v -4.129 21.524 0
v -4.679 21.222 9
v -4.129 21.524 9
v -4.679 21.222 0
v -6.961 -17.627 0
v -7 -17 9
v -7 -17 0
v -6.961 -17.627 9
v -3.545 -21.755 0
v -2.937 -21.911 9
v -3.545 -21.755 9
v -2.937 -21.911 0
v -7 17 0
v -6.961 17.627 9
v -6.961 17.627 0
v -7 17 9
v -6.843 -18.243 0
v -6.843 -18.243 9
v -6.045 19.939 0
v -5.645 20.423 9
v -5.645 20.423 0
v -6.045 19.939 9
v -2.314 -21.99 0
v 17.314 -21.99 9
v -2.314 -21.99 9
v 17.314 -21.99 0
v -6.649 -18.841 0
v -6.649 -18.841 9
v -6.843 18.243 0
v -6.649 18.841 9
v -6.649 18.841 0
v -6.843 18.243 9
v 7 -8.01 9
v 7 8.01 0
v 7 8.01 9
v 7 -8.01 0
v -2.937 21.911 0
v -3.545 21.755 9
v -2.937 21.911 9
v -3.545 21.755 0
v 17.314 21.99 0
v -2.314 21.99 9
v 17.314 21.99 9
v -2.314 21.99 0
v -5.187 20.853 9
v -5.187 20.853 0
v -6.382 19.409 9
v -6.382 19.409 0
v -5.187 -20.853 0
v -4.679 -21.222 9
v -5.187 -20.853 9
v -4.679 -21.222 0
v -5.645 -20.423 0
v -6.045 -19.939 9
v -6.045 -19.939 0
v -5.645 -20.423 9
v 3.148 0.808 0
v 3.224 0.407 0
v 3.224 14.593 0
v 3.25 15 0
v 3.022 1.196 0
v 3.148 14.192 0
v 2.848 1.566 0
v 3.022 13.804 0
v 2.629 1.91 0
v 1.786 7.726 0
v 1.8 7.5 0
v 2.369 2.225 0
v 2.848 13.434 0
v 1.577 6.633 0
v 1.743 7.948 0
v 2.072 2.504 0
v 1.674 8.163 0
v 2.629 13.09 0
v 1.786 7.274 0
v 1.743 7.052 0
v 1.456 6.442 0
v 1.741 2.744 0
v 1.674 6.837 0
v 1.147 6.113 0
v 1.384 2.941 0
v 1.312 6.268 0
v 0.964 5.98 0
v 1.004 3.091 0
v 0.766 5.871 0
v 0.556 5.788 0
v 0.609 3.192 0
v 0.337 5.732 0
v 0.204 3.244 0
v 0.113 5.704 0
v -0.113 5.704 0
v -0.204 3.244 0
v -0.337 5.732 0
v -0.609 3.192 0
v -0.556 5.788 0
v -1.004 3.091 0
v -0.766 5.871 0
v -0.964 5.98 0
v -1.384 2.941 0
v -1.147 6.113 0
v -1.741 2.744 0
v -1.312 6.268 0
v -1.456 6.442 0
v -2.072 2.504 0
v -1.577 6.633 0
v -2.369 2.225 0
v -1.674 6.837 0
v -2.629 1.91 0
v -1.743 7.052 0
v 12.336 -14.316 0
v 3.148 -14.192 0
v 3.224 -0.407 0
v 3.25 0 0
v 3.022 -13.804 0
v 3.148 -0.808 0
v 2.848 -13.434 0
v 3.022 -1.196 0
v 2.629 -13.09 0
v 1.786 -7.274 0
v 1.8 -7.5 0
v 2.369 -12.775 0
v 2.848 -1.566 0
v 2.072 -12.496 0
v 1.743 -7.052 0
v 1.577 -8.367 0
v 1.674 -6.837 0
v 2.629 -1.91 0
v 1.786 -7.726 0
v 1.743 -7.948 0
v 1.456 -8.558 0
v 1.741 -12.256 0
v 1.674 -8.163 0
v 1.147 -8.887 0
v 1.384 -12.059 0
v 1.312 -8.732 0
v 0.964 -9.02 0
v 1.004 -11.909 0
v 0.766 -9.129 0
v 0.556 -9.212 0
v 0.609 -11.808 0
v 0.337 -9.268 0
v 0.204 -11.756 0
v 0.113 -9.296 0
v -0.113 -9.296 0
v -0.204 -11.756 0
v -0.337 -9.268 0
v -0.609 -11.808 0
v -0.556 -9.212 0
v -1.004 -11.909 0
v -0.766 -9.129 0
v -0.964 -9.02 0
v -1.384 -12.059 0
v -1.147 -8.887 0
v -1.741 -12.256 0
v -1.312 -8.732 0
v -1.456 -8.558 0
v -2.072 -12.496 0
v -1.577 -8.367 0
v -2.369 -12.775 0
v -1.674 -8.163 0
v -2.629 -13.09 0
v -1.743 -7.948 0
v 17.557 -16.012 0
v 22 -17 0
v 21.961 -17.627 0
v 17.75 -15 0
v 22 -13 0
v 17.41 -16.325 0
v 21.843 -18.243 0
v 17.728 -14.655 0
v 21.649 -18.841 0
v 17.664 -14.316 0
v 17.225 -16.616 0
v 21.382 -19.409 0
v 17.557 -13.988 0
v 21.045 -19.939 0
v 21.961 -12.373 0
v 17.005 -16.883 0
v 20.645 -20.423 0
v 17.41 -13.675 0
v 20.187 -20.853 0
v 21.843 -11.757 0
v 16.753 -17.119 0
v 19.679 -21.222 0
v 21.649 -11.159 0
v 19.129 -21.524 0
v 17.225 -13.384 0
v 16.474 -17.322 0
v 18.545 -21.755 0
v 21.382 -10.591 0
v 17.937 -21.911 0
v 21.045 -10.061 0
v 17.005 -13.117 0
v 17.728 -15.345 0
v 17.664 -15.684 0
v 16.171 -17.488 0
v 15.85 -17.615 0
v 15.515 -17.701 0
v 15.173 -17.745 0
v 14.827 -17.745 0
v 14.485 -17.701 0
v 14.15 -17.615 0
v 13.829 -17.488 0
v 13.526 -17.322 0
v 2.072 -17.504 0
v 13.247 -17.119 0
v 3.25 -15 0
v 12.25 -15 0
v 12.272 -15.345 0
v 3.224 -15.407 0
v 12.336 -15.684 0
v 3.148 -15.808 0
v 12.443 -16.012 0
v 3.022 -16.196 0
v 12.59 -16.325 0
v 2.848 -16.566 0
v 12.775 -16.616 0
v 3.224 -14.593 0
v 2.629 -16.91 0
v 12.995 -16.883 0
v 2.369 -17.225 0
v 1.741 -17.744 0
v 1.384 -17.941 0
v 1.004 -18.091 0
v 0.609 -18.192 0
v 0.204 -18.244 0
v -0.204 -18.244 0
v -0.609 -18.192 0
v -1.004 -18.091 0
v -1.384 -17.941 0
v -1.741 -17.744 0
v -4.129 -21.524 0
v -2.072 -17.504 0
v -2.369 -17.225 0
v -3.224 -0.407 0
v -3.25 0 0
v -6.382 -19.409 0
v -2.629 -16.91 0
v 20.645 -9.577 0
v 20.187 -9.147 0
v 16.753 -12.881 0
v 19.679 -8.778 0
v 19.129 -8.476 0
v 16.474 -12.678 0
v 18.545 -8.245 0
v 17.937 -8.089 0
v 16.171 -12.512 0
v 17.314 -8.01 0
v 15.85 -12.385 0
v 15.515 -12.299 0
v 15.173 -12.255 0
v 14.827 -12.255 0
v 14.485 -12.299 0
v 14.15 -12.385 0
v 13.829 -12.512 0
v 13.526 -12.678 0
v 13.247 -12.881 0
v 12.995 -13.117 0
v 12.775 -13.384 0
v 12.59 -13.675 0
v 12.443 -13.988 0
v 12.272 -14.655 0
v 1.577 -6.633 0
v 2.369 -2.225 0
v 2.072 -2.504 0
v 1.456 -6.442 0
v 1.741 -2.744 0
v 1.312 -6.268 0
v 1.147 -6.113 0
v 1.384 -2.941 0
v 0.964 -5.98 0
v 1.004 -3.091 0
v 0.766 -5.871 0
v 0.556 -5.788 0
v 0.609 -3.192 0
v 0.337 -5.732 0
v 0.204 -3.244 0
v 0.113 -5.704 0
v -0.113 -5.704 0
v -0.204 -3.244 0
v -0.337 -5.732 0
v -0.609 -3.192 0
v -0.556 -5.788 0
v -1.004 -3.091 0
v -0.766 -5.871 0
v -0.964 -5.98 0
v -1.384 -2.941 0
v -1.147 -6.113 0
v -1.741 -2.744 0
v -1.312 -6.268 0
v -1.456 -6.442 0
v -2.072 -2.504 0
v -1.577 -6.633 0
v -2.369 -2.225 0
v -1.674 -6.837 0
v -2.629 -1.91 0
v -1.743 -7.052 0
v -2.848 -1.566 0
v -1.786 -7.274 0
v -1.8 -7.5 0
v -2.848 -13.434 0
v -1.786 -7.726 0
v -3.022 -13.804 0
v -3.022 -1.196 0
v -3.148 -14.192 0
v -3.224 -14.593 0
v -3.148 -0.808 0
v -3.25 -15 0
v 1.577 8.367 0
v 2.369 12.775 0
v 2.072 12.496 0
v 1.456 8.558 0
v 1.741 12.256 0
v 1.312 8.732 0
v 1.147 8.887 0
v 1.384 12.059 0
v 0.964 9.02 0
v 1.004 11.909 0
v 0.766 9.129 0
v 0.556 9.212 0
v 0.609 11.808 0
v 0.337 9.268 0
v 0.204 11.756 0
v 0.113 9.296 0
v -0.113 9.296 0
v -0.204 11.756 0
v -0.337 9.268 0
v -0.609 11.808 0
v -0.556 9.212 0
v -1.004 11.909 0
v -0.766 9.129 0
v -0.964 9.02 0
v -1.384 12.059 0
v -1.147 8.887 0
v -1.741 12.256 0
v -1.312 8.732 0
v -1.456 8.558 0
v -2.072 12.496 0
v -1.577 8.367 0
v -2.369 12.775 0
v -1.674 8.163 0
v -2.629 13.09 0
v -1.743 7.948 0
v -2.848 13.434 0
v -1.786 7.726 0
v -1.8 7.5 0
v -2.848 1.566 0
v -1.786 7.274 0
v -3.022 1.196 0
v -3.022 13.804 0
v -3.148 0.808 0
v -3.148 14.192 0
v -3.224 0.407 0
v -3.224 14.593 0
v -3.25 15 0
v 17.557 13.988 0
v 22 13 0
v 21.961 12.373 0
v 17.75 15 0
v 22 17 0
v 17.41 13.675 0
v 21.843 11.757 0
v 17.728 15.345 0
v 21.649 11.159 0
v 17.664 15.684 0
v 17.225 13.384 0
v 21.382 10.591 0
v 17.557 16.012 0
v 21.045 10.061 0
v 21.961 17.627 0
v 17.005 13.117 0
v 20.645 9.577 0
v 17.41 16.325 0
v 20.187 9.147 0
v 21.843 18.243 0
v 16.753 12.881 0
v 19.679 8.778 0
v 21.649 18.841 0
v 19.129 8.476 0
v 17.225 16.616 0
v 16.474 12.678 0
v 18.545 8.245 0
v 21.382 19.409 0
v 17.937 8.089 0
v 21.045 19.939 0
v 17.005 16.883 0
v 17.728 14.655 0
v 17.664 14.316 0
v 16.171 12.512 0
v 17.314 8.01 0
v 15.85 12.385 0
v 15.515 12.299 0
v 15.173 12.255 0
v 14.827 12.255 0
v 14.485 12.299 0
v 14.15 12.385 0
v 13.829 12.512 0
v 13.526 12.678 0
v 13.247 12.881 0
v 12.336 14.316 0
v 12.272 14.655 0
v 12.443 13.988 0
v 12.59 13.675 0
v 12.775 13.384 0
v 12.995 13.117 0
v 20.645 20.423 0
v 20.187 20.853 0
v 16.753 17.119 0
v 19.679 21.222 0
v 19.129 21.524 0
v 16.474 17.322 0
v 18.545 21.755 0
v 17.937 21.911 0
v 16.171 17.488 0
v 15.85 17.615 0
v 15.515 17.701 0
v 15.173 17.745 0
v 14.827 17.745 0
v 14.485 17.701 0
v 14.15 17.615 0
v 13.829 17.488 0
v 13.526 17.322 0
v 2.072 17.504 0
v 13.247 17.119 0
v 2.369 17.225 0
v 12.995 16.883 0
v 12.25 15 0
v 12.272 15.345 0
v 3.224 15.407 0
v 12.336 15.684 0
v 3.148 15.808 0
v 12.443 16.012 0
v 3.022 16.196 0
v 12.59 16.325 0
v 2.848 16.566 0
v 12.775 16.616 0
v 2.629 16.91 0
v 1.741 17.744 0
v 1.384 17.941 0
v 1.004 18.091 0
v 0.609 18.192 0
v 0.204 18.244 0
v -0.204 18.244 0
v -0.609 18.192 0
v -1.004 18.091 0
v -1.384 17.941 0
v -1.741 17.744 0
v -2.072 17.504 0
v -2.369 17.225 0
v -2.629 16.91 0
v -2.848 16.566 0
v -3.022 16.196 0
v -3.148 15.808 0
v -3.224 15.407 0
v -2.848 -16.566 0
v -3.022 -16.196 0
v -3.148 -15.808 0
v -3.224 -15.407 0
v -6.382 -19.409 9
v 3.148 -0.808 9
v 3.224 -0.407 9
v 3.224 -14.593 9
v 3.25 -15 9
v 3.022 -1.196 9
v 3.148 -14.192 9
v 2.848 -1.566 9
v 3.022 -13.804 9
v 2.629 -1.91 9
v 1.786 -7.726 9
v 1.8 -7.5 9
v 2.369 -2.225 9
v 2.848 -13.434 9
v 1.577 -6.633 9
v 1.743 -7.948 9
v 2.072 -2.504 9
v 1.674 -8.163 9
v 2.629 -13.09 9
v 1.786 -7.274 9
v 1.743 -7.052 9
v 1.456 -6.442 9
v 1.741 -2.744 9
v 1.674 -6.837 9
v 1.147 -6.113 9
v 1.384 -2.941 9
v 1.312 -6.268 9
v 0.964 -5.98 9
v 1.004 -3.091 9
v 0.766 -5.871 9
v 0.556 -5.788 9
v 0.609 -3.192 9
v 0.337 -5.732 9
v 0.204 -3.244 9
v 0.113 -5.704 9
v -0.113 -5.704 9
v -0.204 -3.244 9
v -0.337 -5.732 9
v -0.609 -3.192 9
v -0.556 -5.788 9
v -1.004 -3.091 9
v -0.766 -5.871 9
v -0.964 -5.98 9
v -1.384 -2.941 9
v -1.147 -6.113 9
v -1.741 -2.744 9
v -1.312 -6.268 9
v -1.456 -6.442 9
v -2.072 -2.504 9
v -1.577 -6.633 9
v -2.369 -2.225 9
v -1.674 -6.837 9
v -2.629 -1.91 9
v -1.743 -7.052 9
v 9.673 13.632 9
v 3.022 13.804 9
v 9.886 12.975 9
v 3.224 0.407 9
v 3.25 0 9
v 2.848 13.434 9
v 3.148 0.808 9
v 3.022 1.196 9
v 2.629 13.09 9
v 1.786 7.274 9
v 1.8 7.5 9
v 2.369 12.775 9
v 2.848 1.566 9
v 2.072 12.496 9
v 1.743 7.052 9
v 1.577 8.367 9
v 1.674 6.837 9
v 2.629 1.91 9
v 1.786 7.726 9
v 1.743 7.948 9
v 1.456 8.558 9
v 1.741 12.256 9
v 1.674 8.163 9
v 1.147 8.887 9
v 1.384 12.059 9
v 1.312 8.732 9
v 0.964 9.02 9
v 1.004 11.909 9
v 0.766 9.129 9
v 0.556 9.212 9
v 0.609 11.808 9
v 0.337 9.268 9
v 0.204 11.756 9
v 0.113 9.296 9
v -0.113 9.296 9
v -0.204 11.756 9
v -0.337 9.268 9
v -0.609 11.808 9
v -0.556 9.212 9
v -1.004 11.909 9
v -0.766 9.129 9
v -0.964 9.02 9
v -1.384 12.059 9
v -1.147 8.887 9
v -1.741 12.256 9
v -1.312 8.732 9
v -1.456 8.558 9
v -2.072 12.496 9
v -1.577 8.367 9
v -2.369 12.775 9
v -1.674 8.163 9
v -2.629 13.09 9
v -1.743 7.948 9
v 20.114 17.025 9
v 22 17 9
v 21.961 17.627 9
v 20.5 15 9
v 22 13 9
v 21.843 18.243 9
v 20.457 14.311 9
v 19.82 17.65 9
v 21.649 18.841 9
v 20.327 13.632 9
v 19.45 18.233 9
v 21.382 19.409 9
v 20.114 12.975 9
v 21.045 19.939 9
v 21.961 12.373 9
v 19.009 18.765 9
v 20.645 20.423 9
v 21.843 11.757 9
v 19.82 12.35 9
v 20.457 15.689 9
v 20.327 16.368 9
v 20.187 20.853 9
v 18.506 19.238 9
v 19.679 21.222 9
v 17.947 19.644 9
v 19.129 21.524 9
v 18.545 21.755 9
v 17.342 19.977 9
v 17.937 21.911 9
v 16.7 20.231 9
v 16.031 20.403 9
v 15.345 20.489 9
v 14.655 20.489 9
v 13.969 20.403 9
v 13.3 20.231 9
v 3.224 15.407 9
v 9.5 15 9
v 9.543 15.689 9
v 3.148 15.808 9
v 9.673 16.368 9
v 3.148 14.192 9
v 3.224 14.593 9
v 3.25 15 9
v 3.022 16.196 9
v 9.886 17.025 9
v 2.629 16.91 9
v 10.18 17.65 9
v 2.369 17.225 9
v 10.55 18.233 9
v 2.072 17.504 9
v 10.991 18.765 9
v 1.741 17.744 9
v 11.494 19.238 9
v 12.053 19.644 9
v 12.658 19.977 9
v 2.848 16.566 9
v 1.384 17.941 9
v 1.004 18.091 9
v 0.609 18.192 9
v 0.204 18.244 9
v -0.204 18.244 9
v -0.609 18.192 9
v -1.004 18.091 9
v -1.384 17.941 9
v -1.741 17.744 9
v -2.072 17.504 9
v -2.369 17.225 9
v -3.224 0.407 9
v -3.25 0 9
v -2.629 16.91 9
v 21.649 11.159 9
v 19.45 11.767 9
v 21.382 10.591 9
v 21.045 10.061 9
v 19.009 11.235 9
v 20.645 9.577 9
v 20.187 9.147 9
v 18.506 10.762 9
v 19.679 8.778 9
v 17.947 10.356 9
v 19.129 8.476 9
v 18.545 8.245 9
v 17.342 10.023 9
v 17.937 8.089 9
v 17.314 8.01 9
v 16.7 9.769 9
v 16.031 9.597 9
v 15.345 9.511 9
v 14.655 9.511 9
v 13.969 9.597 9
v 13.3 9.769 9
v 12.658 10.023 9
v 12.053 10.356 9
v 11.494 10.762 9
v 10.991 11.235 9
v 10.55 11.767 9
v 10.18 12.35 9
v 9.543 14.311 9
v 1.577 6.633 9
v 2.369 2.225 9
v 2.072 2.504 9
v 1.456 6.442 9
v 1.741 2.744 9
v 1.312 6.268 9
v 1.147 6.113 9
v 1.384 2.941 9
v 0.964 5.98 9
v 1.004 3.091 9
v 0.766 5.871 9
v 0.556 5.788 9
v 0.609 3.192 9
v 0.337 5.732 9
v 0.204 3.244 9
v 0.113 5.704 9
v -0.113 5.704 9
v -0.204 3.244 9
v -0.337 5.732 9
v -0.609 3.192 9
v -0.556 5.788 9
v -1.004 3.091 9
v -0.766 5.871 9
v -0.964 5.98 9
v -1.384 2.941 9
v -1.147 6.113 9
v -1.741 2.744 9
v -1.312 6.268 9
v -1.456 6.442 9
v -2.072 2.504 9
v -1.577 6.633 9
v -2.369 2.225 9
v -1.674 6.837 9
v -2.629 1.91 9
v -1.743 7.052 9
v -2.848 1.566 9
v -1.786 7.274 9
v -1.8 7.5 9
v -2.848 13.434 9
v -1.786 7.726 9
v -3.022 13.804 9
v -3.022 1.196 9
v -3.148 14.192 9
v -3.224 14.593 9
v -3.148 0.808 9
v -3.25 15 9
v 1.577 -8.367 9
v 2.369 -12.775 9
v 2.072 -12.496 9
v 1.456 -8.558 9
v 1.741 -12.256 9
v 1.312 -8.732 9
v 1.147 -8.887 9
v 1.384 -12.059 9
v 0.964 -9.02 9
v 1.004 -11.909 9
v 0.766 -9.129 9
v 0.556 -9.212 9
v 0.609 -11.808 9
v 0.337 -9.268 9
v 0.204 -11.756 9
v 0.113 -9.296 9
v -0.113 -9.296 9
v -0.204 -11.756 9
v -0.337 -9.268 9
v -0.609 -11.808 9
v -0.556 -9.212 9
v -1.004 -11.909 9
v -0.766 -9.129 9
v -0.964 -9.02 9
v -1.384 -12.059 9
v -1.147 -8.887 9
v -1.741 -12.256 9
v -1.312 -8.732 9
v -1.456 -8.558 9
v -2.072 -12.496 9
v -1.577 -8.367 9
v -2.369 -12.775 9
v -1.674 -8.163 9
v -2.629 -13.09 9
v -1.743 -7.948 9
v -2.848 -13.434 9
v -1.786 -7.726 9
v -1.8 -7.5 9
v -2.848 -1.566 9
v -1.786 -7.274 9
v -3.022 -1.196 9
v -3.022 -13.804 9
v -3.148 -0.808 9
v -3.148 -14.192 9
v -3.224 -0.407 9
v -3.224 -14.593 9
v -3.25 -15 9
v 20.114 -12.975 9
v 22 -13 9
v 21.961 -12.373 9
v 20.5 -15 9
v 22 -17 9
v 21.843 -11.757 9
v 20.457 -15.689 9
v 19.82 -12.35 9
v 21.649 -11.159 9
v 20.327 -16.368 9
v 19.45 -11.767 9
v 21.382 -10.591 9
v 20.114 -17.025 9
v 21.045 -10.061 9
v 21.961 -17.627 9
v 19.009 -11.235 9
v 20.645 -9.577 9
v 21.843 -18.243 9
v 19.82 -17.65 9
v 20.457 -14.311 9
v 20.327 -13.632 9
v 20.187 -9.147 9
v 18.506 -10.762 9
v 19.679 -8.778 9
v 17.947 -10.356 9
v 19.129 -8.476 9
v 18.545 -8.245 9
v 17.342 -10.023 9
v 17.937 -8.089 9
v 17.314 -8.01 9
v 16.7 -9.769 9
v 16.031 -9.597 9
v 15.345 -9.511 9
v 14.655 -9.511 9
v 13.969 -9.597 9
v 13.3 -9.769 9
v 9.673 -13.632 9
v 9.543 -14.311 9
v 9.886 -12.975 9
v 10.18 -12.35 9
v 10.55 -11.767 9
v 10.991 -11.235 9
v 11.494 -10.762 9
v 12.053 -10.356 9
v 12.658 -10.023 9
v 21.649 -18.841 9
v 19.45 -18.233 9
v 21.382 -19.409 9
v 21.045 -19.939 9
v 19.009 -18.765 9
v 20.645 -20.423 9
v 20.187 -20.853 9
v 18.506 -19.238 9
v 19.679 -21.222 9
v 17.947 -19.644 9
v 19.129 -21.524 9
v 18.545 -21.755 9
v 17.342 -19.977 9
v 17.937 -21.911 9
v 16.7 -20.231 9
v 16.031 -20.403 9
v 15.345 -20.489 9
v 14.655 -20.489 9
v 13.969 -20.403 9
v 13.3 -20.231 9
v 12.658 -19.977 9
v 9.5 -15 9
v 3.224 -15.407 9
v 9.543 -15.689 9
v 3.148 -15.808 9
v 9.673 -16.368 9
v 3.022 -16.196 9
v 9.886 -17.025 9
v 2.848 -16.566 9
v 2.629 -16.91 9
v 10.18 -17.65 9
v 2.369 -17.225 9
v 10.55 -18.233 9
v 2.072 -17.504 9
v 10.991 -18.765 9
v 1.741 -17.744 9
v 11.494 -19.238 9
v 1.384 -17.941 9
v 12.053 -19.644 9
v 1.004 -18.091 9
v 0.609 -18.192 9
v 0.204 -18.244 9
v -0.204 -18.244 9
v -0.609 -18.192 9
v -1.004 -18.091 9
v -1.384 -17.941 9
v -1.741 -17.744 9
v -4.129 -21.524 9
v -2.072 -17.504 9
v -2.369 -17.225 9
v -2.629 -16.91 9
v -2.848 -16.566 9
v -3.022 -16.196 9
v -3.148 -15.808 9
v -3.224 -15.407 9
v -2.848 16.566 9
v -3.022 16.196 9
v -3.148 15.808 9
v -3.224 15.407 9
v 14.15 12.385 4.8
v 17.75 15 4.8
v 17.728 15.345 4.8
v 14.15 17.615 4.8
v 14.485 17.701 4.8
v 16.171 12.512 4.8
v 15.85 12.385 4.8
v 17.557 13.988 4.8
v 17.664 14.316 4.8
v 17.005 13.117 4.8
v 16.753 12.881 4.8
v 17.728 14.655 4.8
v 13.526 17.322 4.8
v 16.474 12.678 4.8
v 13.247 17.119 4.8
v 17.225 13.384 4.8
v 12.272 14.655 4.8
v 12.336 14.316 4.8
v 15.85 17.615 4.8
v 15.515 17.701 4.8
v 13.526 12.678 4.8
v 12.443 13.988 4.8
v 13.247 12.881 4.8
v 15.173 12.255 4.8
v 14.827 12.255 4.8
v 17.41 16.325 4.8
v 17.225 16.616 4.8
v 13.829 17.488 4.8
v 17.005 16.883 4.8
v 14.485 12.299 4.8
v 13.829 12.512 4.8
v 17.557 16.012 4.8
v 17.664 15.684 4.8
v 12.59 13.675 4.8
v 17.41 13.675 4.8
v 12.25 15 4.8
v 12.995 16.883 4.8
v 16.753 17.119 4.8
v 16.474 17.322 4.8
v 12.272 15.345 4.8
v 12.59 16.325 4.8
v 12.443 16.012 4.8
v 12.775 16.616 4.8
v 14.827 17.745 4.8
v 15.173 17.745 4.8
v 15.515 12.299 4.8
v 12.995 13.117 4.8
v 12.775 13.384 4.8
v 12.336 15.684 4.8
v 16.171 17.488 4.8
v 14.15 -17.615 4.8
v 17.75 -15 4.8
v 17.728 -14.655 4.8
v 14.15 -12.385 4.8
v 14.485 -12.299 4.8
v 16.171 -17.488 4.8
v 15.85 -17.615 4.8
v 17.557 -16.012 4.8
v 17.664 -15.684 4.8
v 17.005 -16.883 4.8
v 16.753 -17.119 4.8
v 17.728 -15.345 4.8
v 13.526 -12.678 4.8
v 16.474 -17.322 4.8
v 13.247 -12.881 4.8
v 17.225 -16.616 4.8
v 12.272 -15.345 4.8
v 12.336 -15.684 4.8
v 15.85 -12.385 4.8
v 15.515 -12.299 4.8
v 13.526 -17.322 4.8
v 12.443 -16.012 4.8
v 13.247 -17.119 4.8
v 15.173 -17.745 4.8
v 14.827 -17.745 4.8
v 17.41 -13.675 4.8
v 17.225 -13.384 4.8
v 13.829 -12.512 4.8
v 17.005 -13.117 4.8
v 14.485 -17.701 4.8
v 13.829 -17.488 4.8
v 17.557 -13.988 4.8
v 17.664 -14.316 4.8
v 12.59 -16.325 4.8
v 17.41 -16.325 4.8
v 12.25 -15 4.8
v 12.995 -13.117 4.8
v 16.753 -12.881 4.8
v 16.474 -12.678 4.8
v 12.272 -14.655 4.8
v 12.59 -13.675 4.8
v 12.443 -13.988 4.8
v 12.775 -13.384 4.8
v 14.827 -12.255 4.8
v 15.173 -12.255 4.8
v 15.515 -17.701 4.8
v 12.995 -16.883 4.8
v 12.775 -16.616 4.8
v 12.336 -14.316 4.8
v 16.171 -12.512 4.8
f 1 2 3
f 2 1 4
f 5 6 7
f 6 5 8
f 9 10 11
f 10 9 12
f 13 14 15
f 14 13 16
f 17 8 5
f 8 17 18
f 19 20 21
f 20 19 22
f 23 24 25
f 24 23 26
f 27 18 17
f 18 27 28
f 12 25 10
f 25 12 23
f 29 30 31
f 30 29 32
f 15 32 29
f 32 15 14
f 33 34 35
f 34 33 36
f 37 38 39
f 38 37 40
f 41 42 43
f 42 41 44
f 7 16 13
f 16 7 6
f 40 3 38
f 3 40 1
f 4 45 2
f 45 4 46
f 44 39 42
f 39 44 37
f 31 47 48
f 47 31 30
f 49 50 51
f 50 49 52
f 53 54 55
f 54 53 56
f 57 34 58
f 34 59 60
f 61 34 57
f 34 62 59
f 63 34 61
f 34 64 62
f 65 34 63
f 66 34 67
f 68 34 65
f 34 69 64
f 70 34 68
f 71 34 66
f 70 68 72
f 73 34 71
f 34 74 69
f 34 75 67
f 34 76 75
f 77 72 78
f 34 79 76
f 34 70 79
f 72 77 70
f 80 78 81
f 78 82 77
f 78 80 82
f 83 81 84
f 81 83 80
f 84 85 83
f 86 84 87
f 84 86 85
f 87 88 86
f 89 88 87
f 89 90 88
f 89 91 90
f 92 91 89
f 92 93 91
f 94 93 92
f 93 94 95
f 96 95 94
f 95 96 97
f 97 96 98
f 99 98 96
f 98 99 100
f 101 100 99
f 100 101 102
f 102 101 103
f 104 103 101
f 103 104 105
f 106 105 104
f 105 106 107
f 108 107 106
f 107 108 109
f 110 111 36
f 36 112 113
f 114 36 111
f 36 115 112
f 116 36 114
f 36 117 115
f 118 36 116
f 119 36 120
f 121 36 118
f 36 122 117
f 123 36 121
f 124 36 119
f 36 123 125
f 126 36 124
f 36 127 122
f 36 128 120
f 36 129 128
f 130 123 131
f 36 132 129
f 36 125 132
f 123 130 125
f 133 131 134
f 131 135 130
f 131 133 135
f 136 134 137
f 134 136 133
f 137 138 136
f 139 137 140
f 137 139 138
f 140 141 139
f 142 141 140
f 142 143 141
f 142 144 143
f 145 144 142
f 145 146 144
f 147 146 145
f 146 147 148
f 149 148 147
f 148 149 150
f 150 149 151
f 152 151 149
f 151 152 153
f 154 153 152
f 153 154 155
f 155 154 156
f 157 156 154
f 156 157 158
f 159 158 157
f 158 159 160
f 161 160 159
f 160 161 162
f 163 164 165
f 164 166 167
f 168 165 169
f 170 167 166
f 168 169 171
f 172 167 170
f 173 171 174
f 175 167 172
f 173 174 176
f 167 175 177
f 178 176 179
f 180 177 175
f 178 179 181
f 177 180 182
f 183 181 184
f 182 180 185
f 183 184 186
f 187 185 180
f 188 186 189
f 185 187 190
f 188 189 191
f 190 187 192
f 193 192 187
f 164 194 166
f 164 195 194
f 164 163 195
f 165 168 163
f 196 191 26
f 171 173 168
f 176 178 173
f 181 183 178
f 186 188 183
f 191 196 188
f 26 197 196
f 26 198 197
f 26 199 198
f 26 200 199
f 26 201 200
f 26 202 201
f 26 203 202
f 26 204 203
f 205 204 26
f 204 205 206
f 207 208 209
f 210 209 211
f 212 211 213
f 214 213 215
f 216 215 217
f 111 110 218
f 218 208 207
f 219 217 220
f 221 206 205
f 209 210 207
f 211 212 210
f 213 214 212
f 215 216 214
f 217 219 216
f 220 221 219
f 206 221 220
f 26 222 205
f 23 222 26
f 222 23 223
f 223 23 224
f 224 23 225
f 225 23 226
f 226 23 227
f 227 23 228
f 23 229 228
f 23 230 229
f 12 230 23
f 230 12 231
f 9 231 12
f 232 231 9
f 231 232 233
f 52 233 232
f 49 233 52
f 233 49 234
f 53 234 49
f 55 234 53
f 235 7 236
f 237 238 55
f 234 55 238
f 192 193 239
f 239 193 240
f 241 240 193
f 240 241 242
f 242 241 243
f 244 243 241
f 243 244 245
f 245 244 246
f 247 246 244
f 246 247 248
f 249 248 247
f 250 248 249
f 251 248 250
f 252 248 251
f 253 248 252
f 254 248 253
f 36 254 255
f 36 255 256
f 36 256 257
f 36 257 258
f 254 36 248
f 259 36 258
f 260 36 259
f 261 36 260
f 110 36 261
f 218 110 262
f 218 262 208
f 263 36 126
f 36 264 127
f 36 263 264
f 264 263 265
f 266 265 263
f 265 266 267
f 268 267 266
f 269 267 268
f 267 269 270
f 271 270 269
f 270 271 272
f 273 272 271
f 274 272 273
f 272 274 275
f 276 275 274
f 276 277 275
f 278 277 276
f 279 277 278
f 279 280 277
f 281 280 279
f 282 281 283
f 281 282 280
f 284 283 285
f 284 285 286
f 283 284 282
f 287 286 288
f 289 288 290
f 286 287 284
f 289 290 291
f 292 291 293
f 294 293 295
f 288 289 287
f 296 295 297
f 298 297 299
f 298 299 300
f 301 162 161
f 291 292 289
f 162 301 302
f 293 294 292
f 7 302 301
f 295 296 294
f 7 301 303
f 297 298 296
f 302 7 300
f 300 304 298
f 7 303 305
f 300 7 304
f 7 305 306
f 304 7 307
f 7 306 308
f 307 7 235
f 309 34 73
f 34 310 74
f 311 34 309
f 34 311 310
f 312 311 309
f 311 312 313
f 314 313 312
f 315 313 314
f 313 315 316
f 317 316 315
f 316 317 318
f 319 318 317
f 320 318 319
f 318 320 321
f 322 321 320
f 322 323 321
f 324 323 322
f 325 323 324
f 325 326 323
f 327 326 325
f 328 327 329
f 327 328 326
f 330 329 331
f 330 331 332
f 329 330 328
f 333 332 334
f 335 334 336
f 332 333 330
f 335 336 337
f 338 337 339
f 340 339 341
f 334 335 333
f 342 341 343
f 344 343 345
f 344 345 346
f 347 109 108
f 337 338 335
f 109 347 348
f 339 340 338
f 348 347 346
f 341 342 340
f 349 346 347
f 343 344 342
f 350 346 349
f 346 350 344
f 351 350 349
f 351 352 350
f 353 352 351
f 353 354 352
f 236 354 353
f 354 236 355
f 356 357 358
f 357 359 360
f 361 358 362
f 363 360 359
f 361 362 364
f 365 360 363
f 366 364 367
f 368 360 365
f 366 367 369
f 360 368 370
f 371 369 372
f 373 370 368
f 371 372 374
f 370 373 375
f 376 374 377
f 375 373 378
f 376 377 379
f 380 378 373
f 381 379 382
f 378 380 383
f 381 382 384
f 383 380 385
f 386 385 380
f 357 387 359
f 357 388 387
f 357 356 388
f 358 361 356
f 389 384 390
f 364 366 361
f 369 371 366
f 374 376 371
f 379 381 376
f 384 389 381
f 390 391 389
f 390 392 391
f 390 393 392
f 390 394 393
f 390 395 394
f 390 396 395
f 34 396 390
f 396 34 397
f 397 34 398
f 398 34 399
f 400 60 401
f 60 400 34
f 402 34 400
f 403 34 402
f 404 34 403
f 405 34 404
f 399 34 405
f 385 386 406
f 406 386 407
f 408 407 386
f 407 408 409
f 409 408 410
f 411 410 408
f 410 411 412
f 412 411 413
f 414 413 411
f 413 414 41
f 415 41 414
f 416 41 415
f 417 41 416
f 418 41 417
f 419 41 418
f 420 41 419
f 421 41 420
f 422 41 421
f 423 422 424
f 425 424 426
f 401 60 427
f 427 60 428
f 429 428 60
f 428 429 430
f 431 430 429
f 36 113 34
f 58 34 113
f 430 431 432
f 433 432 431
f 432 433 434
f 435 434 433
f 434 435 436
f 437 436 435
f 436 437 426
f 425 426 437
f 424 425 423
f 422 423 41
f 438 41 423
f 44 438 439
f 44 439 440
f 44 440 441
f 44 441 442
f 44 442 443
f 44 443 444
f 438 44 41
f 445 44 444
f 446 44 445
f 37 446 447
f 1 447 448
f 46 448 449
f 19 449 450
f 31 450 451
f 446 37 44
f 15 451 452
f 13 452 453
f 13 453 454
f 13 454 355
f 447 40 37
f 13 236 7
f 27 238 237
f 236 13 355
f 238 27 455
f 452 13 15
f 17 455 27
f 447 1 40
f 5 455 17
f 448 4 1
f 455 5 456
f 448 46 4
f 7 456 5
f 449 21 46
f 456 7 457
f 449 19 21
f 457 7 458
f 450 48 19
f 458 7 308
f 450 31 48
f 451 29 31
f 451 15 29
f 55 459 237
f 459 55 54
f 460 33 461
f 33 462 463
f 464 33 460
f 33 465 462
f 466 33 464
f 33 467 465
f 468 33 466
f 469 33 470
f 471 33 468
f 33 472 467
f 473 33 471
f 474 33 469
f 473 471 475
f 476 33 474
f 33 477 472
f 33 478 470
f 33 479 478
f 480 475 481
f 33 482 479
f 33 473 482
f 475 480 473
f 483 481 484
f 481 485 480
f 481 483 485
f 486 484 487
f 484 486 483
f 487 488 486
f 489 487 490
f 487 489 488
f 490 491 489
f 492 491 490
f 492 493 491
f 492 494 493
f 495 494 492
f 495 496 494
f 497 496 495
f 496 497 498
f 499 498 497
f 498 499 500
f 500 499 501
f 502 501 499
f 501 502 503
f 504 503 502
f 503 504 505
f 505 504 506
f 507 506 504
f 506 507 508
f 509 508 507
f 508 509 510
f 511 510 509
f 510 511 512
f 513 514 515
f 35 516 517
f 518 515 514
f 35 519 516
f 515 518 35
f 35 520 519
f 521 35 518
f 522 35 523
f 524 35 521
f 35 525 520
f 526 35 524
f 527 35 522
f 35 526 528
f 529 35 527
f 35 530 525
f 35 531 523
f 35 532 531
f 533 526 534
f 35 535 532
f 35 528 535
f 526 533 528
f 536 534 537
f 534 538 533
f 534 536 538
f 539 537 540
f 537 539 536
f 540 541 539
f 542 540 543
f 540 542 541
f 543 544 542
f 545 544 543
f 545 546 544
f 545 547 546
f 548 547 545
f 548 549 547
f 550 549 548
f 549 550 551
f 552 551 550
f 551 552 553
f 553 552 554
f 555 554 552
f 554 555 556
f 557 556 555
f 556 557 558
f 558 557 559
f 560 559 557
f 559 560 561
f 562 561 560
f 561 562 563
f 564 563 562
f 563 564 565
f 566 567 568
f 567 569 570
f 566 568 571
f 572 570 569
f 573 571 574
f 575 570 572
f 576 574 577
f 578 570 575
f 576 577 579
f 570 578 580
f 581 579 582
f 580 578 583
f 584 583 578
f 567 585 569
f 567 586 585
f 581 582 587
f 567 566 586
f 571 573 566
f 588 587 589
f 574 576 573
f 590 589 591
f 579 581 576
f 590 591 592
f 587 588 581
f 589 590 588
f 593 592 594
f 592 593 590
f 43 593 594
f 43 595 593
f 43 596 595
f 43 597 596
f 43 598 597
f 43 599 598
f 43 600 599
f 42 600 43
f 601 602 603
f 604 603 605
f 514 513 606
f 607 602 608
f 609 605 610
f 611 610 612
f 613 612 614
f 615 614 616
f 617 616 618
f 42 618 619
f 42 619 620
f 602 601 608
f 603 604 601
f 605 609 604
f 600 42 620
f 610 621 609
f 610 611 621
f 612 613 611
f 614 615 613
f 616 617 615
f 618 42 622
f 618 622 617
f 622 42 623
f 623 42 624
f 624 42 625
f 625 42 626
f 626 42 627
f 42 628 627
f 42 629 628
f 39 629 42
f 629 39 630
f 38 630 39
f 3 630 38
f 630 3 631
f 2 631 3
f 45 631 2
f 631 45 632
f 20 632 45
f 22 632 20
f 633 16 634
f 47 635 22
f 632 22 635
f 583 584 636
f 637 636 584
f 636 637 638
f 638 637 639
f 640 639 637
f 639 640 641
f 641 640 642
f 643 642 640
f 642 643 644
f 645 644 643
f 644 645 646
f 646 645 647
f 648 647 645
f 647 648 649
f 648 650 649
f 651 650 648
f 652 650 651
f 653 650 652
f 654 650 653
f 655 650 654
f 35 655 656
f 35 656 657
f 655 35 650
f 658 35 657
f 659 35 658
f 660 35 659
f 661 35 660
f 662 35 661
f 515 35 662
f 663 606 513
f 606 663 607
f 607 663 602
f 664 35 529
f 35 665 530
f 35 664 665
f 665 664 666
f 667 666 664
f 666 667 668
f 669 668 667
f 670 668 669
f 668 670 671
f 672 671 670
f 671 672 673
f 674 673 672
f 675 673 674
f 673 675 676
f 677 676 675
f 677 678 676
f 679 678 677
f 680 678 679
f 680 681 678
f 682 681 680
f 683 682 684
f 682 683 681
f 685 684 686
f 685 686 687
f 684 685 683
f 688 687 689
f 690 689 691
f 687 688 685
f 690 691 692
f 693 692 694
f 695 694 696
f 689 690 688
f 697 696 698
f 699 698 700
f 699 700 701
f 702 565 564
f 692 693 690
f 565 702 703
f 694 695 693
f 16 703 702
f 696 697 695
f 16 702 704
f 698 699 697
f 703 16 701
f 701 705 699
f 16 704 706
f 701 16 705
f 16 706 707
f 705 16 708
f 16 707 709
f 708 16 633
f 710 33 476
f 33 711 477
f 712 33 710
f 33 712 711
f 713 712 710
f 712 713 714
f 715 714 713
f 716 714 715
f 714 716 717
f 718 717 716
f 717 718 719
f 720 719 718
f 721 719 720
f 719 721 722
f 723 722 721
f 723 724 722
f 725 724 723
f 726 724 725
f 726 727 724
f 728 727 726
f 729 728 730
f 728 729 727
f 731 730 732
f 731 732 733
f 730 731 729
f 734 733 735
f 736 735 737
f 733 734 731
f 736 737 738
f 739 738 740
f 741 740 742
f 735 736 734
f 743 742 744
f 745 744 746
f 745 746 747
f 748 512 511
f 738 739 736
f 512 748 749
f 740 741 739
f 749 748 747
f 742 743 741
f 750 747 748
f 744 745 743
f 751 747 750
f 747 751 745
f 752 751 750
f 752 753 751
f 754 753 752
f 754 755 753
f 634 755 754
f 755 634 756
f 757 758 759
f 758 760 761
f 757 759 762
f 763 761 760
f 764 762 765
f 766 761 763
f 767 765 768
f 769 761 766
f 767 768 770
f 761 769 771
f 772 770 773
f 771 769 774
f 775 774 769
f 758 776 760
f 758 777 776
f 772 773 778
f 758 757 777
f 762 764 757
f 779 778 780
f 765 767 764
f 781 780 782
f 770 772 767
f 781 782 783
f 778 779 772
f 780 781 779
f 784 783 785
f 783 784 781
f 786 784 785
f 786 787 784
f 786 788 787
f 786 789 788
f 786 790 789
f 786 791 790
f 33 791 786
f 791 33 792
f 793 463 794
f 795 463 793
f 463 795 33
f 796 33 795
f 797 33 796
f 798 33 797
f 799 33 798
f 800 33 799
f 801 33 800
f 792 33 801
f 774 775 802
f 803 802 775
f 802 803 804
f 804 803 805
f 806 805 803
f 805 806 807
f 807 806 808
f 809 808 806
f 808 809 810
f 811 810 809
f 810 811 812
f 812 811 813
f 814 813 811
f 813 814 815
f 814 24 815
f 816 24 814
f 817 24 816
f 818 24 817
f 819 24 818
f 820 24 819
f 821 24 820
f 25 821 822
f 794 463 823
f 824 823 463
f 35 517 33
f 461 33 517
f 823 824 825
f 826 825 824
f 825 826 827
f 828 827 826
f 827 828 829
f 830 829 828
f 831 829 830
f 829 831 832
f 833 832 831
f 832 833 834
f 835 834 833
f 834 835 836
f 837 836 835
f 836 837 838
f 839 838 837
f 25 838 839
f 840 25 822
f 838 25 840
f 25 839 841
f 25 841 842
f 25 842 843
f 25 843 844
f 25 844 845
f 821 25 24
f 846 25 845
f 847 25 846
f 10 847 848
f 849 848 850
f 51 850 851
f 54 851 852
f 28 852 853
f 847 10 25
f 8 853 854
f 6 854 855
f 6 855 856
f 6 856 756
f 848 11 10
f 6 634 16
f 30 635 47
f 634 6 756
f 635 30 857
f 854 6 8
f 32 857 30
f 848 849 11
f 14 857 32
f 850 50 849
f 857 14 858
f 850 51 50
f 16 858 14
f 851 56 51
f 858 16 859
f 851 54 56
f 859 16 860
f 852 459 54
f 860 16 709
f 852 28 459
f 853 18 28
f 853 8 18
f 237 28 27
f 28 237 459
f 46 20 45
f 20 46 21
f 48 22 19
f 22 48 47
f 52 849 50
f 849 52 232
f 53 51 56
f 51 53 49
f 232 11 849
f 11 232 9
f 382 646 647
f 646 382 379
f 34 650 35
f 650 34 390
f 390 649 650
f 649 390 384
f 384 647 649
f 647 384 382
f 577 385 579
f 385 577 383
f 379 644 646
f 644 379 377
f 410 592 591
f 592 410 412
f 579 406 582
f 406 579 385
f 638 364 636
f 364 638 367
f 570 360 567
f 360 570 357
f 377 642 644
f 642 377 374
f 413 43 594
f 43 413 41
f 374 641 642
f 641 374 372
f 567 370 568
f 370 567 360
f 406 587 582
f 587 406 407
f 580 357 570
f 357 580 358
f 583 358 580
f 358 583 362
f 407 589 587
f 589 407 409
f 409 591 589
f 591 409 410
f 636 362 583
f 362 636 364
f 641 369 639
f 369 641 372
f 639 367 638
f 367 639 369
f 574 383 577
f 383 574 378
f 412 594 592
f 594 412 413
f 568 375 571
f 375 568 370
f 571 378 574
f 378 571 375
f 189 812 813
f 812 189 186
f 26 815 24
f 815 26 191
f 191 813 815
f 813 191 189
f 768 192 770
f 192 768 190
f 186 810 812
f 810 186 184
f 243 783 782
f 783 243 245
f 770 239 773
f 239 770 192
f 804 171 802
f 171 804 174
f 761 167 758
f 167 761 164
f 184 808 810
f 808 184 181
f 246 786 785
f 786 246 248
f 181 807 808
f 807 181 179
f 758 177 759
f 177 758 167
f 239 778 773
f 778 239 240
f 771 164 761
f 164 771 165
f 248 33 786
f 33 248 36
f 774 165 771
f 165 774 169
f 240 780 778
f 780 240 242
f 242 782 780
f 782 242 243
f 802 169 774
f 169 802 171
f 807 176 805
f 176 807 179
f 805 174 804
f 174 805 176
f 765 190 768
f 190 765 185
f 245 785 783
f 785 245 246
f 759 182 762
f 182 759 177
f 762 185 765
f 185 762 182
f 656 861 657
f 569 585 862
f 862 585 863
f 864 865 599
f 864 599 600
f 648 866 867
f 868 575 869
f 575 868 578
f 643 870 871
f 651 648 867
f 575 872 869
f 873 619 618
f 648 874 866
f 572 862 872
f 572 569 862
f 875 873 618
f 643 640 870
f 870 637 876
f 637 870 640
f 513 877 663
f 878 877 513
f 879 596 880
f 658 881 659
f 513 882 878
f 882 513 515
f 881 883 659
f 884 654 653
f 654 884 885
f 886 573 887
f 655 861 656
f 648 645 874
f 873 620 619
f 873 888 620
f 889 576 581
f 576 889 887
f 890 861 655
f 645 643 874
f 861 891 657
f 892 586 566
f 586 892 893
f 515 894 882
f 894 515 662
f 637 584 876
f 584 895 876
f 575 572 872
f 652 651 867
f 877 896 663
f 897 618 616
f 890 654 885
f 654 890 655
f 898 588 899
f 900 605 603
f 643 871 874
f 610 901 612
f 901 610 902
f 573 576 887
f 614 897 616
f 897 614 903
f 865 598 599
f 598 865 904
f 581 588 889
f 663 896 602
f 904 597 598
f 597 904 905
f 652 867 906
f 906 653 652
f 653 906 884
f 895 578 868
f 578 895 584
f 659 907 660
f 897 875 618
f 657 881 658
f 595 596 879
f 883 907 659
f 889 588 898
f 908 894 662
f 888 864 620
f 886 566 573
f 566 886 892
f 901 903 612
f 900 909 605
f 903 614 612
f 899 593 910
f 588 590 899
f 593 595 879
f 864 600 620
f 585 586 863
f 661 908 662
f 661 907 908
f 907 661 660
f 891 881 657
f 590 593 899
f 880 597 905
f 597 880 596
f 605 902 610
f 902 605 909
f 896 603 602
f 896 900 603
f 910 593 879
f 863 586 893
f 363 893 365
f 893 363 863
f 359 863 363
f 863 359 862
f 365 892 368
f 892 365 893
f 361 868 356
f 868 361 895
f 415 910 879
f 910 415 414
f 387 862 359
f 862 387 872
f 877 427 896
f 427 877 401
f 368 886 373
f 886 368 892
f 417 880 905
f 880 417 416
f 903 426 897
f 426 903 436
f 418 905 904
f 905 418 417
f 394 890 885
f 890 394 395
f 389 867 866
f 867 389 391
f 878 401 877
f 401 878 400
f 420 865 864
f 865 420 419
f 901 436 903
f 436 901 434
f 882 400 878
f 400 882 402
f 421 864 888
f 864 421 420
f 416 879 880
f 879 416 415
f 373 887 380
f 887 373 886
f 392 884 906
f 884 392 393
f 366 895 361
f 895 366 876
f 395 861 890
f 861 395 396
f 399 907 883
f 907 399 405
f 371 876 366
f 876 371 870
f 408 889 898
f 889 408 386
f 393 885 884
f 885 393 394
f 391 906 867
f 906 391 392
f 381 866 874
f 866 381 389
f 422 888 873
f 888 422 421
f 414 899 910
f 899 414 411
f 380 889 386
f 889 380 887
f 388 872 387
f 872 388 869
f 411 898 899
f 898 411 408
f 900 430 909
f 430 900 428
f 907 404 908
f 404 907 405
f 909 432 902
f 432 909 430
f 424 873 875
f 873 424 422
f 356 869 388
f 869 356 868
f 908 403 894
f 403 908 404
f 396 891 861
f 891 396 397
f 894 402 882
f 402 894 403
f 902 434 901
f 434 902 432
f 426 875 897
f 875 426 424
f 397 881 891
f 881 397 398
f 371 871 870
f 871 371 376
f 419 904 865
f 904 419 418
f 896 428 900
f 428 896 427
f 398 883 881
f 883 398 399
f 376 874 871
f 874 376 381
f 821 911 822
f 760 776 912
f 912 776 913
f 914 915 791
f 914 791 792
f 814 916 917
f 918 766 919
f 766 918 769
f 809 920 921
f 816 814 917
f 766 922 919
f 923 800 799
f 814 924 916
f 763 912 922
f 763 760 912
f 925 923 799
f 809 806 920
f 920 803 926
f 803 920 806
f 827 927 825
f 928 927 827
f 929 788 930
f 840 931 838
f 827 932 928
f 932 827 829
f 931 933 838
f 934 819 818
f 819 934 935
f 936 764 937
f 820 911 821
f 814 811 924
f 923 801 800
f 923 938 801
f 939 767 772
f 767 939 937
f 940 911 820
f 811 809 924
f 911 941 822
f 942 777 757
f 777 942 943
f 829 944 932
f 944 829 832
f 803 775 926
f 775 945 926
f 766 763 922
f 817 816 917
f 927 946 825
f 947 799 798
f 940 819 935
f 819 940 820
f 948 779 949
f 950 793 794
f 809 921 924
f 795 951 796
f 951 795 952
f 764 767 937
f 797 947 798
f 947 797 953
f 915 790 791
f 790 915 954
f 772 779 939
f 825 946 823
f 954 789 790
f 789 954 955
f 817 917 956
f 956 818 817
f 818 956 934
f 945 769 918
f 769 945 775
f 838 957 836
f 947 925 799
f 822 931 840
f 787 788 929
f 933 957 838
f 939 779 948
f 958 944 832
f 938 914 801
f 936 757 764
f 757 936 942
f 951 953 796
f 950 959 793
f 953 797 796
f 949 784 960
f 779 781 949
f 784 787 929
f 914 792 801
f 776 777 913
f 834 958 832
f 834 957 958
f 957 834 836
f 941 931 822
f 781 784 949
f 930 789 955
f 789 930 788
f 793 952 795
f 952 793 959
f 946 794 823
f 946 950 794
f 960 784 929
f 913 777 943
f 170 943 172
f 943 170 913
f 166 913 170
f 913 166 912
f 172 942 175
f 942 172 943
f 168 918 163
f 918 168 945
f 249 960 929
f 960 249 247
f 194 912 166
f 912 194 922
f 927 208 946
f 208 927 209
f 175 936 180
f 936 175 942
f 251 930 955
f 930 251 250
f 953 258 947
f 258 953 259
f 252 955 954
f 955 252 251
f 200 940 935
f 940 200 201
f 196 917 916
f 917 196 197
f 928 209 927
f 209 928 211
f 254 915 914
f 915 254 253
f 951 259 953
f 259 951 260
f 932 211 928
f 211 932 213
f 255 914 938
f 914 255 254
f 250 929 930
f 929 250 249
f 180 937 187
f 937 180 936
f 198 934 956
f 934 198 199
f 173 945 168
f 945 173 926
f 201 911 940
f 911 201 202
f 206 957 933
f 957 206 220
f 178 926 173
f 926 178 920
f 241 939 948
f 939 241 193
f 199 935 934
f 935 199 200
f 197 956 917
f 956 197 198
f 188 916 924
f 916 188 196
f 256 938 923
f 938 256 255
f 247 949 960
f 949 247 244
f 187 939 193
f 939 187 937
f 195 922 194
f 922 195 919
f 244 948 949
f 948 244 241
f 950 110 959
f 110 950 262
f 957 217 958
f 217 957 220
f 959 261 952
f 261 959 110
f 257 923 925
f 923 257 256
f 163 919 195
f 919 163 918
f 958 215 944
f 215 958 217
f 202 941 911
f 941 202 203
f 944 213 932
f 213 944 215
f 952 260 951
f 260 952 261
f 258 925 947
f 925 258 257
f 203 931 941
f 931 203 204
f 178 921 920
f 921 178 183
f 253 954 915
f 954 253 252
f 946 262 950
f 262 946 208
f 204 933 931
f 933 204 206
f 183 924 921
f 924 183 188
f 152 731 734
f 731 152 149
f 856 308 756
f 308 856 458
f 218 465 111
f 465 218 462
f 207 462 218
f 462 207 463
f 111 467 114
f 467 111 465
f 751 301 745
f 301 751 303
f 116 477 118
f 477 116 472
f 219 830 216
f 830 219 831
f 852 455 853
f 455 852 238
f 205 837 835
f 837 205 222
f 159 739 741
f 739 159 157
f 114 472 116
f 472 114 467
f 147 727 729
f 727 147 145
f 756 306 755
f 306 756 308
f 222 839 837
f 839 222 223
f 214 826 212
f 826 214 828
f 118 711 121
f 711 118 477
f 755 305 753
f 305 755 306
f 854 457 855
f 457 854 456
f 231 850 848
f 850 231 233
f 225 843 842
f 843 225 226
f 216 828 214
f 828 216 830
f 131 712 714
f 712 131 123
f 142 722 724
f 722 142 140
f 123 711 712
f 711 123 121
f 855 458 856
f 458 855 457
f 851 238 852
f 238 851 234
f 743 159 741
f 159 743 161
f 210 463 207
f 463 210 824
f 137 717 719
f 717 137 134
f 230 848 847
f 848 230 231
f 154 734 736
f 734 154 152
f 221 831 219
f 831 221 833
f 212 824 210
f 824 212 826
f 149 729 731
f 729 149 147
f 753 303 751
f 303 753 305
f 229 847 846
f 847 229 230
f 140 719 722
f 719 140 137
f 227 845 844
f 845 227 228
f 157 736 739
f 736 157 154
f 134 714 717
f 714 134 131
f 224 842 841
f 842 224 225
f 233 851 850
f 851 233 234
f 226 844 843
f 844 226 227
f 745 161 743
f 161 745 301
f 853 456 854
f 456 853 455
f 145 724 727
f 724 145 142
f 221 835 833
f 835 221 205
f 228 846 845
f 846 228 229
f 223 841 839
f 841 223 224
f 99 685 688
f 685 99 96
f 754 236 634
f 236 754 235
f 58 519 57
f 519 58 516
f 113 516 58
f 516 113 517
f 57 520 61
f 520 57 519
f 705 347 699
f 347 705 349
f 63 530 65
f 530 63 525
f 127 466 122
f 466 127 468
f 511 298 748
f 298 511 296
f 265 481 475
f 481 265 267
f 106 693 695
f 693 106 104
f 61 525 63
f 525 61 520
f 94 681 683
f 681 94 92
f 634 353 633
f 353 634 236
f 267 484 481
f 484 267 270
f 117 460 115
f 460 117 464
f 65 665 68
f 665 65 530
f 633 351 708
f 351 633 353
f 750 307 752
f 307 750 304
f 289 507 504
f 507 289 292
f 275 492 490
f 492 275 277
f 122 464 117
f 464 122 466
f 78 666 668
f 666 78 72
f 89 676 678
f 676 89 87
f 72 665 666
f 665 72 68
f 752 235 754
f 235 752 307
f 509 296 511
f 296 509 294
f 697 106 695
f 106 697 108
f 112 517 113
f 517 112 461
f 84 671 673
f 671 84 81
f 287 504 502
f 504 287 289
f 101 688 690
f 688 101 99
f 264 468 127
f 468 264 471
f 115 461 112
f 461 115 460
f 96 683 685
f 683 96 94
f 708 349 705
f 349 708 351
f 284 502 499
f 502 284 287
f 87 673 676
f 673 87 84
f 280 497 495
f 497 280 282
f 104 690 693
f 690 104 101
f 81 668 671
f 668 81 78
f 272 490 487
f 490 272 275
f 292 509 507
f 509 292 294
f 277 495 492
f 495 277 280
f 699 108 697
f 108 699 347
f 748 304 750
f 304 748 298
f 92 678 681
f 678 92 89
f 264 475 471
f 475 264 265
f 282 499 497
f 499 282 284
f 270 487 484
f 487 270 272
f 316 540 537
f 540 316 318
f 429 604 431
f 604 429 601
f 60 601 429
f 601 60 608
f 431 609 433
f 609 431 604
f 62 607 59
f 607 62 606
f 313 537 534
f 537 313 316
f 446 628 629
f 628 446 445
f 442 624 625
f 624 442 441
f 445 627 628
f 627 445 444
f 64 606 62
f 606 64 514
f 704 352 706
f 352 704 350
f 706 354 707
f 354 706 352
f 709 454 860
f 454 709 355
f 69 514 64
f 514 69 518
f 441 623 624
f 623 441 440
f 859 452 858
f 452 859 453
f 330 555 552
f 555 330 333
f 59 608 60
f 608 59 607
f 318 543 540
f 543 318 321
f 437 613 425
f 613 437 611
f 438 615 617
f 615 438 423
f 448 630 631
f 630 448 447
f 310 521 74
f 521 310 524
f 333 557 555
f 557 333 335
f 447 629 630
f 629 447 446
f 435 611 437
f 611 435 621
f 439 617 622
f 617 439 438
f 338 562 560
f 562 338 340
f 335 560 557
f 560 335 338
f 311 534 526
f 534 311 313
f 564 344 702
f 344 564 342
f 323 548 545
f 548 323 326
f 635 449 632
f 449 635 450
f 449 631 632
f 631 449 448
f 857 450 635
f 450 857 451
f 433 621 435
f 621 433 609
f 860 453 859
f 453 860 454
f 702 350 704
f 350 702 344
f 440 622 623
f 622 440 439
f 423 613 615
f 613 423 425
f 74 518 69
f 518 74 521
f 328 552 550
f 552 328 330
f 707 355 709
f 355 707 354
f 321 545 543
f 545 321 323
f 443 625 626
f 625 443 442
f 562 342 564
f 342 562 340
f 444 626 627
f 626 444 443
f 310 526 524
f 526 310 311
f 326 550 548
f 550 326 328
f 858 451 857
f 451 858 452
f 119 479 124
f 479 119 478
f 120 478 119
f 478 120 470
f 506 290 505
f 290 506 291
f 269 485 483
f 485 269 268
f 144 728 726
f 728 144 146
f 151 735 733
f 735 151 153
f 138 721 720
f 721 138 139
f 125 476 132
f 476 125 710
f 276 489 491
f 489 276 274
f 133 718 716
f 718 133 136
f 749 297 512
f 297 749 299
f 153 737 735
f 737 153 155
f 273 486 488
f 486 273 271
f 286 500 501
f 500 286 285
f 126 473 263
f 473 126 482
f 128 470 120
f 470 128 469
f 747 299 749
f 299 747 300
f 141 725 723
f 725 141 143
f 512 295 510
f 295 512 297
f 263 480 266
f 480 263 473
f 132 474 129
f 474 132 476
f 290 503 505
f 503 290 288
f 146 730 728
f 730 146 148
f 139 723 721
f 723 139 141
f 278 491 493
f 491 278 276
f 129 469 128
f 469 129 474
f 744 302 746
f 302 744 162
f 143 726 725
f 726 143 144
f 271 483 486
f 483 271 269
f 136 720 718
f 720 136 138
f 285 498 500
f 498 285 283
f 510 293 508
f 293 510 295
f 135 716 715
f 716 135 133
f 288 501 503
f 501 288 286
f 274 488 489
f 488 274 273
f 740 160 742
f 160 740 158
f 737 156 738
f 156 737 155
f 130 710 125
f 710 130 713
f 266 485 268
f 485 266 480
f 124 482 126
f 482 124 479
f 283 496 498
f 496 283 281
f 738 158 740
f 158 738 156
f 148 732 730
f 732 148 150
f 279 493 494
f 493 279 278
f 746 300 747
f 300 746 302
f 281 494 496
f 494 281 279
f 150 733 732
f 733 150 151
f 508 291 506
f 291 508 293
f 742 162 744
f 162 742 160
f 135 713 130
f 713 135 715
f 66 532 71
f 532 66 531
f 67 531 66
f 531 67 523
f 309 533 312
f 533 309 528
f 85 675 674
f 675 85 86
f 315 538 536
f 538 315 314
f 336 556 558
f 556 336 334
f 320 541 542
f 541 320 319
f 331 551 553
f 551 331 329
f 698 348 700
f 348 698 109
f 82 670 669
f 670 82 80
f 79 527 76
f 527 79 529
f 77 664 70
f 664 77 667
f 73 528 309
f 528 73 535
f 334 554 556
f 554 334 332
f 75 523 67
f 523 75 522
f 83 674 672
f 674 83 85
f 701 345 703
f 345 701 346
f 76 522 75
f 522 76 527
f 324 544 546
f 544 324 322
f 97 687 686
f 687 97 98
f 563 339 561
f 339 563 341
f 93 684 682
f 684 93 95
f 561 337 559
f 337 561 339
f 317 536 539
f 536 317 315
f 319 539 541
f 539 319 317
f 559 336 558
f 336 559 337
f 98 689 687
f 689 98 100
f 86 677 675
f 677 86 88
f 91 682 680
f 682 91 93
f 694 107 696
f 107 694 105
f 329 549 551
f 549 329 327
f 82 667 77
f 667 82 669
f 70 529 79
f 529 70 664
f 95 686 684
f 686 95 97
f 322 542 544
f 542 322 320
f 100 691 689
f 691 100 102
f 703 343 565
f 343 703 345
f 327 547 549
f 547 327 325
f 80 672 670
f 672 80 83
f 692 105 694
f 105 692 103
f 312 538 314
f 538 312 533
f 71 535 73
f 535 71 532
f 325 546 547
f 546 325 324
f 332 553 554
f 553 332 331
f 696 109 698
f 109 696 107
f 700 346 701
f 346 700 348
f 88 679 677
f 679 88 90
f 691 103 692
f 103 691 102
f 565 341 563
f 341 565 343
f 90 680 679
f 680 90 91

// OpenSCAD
$fn = 50;


difference() {
	union() {
		hull() {
			translate(v = [-2.0000000000, 17.0000000000, 0]) {
				cylinder(h = 9, r = 5);
			}
			translate(v = [2.0000000000, 17.0000000000, 0]) {
				cylinder(h = 9, r = 5);
			}
			translate(v = [-2.0000000000, -17.0000000000, 0]) {
				cylinder(h = 9, r = 5);
			}
			translate(v = [2.0000000000, -17.0000000000, 0]) {
				cylinder(h = 9, r = 5);
			}
		}
		translate(v = [7.5000000000, 15.0000000000, 0]) {
			hull() {
				translate(v = [-9.5000000000, 2.0000000000, 0]) {
					cylinder(h = 9, r = 5);
				}
				translate(v = [9.5000000000, 2.0000000000, 0]) {
					cylinder(h = 9, r = 5);
				}
				translate(v = [-9.5000000000, -2.0000000000, 0]) {
					cylinder(h = 9, r = 5);
				}
				translate(v = [9.5000000000, -2.0000000000, 0]) {
					cylinder(h = 9, r = 5);
				}
			}
		}
		translate(v = [7.5000000000, -15.0000000000, 0]) {
			hull() {
				translate(v = [-9.5000000000, 2.0000000000, 0]) {
					cylinder(h = 9, r = 5);
				}
				translate(v = [9.5000000000, 2.0000000000, 0]) {
					cylinder(h = 9, r = 5);
				}
				translate(v = [-9.5000000000, -2.0000000000, 0]) {
					cylinder(h = 9, r = 5);
				}
				translate(v = [9.5000000000, -2.0000000000, 0]) {
					cylinder(h = 9, r = 5);
				}
			}
		}
	}
	union() {
		translate(v = [15.0000000000, 15.0000000000, 9]) {
			rotate(a = [0, 0, 0]) {
				difference() {
					union() {
						#translate(v = [0, 0, -9.0000000000]) {
							cylinder(h = 9, r = 2.2500000000);
						}
						#translate(v = [0, 0, -4.2000000000]) {
							cylinder(h = 4.2000000000, r1 = 2.7500000000, r2 = 5.5000000000);
						}
						#translate(v = [0, 0, -9.0000000000]) {
							cylinder(h = 9, r = 2.7500000000);
						}
						#translate(v = [0, 0, -9.0000000000]) {
							cylinder(h = 9, r = 2.2500000000);
						}
					}
					union();
				}
			}
		}
		translate(v = [15.0000000000, -15.0000000000, 9]) {
			rotate(a = [0, 0, 0]) {
				difference() {
					union() {
						#translate(v = [0, 0, -9.0000000000]) {
							cylinder(h = 9, r = 2.2500000000);
						}
						#translate(v = [0, 0, -4.2000000000]) {
							cylinder(h = 4.2000000000, r1 = 2.7500000000, r2 = 5.5000000000);
						}
						#translate(v = [0, 0, -9.0000000000]) {
							cylinder(h = 9, r = 2.7500000000);
						}
						#translate(v = [0, 0, -9.0000000000]) {
							cylinder(h = 9, r = 2.2500000000);
						}
					}
					union();
				}
			}
		}
		translate(v = [0.0000000000, -15.0000000000, 0]) {
			translate(v = [0, 0, -100]) {
				cylinder(h = 200, r = 3.2500000000);
			}
		}
		translate(v = [0, 0, -100]) {
			cylinder(h = 200, r = 3.2500000000);
		}
		translate(v = [0.0000000000, 15.0000000000, 0]) {
			translate(v = [0, 0, -100]) {
				cylinder(h = 200, r = 3.2500000000);
			}
		}
		translate(v = [0.0000000000, -15.0000000000, 0]) {
			translate(v = [0, 0, -100]) {
				cylinder(h = 200, r = 1.8000000000);
			}
		}
		translate(v = [0.0000000000, -7.5000000000, 0]) {
			translate(v = [0, 0, -100]) {
				cylinder(h = 200, r = 1.8000000000);
			}
		}
		translate(v = [0, 0, -100]) {
			cylinder(h = 200, r = 1.8000000000);
		}
		translate(v = [0.0000000000, 7.5000000000, 0]) {
			translate(v = [0, 0, -100]) {
				cylinder(h = 200, r = 1.8000000000);
			}
		}
		translate(v = [0.0000000000, 15.0000000000, 0]) {
			translate(v = [0, 0, -100]) {
				cylinder(h = 200, r = 1.8000000000);
			}
		}
	}
}
